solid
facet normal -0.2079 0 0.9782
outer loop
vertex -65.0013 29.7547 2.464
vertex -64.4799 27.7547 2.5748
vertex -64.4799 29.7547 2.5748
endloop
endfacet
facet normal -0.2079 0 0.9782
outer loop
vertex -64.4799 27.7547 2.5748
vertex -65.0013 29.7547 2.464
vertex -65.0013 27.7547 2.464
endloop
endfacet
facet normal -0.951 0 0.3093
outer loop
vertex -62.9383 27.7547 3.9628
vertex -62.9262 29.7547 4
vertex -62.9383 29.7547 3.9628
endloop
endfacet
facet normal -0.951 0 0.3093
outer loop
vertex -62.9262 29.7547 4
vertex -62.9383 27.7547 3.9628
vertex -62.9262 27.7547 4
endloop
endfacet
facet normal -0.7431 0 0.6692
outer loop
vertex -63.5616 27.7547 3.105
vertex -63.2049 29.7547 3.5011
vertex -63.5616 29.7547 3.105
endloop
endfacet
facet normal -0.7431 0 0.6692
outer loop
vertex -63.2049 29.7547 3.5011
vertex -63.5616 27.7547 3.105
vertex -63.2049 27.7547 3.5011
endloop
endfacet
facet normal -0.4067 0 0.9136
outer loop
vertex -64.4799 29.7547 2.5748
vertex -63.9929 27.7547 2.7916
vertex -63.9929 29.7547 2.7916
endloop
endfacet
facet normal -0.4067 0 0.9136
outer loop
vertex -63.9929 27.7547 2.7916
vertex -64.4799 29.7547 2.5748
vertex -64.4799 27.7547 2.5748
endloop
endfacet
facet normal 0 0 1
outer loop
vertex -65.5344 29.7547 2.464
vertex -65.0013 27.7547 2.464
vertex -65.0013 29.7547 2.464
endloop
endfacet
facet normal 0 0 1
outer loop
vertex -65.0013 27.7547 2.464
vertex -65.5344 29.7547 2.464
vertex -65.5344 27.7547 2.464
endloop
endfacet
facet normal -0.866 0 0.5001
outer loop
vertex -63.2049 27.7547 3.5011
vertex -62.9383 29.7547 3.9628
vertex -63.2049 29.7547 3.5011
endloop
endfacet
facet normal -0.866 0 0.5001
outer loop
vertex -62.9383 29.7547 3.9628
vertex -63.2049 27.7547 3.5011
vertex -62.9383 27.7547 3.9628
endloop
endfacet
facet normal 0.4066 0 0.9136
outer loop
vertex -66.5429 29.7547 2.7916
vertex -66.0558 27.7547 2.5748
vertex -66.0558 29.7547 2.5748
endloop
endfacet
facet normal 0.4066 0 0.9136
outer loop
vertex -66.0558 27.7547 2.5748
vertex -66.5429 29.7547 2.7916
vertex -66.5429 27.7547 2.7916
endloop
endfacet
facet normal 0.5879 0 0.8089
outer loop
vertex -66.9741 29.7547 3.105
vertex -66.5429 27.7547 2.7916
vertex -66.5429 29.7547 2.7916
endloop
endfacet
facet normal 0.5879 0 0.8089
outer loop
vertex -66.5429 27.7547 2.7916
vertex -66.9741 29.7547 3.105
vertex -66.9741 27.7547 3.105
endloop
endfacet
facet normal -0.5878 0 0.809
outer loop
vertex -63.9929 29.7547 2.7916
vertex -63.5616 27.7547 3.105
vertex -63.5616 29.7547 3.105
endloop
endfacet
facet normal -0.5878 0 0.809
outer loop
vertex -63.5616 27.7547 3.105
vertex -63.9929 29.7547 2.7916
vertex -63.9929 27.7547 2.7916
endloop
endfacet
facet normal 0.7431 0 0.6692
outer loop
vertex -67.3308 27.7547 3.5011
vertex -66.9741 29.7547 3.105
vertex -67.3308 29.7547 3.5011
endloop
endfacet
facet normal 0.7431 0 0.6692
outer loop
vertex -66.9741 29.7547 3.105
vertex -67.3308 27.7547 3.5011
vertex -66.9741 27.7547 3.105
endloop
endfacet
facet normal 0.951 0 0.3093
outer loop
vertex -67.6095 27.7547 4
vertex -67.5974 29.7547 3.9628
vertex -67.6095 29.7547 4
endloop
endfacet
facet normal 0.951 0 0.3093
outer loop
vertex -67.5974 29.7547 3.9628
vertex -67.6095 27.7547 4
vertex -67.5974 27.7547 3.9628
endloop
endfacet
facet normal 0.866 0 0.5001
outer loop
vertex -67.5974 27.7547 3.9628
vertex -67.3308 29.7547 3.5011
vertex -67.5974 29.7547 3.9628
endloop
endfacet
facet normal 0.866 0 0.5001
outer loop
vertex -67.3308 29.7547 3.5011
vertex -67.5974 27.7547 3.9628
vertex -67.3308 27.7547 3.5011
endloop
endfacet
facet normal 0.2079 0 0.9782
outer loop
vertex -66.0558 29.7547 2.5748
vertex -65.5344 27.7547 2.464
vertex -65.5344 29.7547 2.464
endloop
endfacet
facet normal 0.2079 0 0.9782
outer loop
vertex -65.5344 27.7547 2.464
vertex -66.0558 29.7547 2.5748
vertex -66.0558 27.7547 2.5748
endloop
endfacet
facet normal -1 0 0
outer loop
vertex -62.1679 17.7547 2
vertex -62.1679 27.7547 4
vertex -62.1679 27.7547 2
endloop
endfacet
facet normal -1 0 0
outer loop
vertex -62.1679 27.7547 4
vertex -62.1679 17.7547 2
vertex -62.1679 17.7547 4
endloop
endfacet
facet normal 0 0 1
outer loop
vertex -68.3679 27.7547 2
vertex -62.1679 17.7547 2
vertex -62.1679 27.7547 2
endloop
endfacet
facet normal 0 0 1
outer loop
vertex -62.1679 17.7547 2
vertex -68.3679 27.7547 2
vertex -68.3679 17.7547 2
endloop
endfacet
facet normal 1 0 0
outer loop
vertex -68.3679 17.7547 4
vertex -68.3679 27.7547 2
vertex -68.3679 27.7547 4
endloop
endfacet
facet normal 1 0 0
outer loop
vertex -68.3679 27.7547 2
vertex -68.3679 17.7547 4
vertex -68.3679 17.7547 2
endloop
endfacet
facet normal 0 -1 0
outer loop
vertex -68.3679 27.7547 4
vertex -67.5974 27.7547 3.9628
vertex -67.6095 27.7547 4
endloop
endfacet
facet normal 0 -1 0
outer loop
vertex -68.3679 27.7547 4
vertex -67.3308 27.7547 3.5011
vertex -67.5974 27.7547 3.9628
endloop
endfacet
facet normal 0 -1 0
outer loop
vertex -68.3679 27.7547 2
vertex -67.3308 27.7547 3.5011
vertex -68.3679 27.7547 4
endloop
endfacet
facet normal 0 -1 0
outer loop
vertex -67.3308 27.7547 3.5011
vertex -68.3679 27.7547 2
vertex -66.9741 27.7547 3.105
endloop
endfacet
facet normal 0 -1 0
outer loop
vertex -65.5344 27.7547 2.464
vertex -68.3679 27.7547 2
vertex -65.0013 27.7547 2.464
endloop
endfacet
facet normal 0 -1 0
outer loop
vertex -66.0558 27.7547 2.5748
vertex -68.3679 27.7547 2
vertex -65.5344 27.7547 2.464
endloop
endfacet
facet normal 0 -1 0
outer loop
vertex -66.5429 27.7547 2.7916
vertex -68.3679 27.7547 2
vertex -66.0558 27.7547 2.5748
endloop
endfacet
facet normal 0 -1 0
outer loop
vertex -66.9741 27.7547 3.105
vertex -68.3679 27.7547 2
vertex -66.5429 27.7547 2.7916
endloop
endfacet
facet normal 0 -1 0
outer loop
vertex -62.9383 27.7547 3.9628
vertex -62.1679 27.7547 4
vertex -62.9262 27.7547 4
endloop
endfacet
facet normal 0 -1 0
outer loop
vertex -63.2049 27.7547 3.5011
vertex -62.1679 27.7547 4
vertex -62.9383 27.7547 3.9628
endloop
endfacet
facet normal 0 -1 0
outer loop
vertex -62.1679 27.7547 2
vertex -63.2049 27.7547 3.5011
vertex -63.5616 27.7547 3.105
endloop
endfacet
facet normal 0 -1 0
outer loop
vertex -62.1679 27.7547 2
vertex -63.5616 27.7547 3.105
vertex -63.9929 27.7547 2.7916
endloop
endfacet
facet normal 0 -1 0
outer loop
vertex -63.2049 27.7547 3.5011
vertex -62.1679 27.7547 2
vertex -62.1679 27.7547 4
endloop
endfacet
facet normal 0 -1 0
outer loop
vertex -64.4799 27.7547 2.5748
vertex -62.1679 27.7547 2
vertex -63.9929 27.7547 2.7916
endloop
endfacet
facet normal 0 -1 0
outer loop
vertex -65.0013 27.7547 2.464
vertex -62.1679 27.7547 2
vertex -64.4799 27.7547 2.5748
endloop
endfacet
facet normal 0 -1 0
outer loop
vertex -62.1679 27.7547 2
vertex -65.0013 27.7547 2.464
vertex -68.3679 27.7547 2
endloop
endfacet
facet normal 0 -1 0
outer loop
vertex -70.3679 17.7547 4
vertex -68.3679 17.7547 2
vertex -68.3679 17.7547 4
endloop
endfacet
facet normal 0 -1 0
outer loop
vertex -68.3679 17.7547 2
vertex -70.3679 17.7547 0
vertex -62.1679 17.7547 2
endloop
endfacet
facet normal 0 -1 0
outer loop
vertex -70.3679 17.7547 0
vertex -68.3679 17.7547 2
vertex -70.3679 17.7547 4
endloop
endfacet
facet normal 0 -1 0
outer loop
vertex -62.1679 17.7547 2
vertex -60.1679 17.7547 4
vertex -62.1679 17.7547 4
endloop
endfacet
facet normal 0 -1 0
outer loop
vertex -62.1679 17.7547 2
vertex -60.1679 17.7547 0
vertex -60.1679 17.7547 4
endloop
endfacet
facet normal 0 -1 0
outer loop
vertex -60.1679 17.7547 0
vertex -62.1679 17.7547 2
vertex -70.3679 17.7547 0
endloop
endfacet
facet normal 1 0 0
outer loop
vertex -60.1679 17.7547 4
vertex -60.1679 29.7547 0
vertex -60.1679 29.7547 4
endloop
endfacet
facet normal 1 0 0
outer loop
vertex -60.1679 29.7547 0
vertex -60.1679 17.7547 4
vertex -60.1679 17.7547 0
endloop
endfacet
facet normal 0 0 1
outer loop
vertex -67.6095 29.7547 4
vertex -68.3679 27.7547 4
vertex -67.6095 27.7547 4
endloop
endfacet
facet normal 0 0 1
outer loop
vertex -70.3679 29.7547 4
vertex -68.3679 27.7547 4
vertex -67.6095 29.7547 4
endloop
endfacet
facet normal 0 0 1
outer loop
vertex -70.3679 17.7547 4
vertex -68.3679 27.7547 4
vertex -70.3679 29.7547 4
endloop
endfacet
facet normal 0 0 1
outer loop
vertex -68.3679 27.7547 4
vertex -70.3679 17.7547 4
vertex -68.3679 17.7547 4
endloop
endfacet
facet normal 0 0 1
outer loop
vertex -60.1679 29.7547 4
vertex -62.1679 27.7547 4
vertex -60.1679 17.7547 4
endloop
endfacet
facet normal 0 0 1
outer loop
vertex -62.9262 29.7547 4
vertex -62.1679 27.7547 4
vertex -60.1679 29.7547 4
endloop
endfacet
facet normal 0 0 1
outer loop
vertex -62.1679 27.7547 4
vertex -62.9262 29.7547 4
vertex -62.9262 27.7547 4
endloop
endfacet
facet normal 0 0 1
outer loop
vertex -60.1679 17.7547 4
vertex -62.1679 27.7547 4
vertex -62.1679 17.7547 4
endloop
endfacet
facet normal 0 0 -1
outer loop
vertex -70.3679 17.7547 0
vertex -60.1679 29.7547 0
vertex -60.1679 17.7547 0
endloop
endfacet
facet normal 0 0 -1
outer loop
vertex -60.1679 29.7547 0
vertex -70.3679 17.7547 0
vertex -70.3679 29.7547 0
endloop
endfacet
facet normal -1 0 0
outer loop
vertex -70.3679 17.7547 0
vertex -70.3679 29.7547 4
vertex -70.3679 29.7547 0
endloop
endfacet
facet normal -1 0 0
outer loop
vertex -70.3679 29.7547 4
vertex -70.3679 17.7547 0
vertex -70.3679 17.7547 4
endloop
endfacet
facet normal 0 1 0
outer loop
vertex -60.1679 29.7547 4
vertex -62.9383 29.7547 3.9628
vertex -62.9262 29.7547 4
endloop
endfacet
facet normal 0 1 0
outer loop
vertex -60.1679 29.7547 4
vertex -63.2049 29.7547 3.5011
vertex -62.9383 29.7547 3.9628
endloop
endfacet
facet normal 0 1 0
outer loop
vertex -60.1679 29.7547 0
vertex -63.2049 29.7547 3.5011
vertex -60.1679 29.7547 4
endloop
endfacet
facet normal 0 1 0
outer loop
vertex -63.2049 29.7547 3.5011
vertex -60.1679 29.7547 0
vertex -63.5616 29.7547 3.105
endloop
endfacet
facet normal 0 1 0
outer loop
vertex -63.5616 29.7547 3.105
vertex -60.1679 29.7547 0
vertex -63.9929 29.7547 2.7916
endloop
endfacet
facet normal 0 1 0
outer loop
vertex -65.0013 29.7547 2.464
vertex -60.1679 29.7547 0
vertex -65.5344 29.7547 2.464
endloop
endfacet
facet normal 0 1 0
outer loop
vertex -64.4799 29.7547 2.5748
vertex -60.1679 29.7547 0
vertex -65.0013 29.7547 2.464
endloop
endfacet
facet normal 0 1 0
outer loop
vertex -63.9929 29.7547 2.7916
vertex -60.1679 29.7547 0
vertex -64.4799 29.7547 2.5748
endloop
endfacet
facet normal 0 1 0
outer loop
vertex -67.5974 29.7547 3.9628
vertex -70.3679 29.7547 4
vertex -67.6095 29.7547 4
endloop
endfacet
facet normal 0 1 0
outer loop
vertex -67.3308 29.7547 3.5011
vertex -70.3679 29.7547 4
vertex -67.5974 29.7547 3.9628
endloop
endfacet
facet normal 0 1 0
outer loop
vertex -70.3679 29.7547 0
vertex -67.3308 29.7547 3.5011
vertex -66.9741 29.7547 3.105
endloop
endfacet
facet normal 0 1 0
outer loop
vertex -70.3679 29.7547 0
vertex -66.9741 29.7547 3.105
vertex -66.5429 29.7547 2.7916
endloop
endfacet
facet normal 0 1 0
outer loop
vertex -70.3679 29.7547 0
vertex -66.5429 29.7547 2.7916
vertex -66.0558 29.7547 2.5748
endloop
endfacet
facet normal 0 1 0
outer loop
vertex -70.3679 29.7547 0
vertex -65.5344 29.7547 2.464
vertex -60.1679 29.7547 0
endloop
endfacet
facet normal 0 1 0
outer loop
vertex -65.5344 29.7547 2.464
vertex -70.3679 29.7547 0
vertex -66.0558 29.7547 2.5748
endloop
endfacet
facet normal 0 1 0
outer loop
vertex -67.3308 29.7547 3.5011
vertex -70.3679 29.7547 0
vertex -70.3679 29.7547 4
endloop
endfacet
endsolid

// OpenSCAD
difference () {
  union () {
    translate ([-65.2678535812682, 23.754651966022536, 2]) {
      cube ([10.2, 12, 4], center=true);
    }
  }
  union () {
    translate ([-65.2678535812682, 29.754651966022536, 5]) {
      rotate (a=90.0, v=[1, 0, 0]) {
        cylinder ($fn=30, h=20, r=2.55, center=true);
      }
    }
    translate ([-65.2678535812682, 22.754651966022536, 5]) {
      cube ([6.2, 10, 6], center=true);
    }
  }
}
